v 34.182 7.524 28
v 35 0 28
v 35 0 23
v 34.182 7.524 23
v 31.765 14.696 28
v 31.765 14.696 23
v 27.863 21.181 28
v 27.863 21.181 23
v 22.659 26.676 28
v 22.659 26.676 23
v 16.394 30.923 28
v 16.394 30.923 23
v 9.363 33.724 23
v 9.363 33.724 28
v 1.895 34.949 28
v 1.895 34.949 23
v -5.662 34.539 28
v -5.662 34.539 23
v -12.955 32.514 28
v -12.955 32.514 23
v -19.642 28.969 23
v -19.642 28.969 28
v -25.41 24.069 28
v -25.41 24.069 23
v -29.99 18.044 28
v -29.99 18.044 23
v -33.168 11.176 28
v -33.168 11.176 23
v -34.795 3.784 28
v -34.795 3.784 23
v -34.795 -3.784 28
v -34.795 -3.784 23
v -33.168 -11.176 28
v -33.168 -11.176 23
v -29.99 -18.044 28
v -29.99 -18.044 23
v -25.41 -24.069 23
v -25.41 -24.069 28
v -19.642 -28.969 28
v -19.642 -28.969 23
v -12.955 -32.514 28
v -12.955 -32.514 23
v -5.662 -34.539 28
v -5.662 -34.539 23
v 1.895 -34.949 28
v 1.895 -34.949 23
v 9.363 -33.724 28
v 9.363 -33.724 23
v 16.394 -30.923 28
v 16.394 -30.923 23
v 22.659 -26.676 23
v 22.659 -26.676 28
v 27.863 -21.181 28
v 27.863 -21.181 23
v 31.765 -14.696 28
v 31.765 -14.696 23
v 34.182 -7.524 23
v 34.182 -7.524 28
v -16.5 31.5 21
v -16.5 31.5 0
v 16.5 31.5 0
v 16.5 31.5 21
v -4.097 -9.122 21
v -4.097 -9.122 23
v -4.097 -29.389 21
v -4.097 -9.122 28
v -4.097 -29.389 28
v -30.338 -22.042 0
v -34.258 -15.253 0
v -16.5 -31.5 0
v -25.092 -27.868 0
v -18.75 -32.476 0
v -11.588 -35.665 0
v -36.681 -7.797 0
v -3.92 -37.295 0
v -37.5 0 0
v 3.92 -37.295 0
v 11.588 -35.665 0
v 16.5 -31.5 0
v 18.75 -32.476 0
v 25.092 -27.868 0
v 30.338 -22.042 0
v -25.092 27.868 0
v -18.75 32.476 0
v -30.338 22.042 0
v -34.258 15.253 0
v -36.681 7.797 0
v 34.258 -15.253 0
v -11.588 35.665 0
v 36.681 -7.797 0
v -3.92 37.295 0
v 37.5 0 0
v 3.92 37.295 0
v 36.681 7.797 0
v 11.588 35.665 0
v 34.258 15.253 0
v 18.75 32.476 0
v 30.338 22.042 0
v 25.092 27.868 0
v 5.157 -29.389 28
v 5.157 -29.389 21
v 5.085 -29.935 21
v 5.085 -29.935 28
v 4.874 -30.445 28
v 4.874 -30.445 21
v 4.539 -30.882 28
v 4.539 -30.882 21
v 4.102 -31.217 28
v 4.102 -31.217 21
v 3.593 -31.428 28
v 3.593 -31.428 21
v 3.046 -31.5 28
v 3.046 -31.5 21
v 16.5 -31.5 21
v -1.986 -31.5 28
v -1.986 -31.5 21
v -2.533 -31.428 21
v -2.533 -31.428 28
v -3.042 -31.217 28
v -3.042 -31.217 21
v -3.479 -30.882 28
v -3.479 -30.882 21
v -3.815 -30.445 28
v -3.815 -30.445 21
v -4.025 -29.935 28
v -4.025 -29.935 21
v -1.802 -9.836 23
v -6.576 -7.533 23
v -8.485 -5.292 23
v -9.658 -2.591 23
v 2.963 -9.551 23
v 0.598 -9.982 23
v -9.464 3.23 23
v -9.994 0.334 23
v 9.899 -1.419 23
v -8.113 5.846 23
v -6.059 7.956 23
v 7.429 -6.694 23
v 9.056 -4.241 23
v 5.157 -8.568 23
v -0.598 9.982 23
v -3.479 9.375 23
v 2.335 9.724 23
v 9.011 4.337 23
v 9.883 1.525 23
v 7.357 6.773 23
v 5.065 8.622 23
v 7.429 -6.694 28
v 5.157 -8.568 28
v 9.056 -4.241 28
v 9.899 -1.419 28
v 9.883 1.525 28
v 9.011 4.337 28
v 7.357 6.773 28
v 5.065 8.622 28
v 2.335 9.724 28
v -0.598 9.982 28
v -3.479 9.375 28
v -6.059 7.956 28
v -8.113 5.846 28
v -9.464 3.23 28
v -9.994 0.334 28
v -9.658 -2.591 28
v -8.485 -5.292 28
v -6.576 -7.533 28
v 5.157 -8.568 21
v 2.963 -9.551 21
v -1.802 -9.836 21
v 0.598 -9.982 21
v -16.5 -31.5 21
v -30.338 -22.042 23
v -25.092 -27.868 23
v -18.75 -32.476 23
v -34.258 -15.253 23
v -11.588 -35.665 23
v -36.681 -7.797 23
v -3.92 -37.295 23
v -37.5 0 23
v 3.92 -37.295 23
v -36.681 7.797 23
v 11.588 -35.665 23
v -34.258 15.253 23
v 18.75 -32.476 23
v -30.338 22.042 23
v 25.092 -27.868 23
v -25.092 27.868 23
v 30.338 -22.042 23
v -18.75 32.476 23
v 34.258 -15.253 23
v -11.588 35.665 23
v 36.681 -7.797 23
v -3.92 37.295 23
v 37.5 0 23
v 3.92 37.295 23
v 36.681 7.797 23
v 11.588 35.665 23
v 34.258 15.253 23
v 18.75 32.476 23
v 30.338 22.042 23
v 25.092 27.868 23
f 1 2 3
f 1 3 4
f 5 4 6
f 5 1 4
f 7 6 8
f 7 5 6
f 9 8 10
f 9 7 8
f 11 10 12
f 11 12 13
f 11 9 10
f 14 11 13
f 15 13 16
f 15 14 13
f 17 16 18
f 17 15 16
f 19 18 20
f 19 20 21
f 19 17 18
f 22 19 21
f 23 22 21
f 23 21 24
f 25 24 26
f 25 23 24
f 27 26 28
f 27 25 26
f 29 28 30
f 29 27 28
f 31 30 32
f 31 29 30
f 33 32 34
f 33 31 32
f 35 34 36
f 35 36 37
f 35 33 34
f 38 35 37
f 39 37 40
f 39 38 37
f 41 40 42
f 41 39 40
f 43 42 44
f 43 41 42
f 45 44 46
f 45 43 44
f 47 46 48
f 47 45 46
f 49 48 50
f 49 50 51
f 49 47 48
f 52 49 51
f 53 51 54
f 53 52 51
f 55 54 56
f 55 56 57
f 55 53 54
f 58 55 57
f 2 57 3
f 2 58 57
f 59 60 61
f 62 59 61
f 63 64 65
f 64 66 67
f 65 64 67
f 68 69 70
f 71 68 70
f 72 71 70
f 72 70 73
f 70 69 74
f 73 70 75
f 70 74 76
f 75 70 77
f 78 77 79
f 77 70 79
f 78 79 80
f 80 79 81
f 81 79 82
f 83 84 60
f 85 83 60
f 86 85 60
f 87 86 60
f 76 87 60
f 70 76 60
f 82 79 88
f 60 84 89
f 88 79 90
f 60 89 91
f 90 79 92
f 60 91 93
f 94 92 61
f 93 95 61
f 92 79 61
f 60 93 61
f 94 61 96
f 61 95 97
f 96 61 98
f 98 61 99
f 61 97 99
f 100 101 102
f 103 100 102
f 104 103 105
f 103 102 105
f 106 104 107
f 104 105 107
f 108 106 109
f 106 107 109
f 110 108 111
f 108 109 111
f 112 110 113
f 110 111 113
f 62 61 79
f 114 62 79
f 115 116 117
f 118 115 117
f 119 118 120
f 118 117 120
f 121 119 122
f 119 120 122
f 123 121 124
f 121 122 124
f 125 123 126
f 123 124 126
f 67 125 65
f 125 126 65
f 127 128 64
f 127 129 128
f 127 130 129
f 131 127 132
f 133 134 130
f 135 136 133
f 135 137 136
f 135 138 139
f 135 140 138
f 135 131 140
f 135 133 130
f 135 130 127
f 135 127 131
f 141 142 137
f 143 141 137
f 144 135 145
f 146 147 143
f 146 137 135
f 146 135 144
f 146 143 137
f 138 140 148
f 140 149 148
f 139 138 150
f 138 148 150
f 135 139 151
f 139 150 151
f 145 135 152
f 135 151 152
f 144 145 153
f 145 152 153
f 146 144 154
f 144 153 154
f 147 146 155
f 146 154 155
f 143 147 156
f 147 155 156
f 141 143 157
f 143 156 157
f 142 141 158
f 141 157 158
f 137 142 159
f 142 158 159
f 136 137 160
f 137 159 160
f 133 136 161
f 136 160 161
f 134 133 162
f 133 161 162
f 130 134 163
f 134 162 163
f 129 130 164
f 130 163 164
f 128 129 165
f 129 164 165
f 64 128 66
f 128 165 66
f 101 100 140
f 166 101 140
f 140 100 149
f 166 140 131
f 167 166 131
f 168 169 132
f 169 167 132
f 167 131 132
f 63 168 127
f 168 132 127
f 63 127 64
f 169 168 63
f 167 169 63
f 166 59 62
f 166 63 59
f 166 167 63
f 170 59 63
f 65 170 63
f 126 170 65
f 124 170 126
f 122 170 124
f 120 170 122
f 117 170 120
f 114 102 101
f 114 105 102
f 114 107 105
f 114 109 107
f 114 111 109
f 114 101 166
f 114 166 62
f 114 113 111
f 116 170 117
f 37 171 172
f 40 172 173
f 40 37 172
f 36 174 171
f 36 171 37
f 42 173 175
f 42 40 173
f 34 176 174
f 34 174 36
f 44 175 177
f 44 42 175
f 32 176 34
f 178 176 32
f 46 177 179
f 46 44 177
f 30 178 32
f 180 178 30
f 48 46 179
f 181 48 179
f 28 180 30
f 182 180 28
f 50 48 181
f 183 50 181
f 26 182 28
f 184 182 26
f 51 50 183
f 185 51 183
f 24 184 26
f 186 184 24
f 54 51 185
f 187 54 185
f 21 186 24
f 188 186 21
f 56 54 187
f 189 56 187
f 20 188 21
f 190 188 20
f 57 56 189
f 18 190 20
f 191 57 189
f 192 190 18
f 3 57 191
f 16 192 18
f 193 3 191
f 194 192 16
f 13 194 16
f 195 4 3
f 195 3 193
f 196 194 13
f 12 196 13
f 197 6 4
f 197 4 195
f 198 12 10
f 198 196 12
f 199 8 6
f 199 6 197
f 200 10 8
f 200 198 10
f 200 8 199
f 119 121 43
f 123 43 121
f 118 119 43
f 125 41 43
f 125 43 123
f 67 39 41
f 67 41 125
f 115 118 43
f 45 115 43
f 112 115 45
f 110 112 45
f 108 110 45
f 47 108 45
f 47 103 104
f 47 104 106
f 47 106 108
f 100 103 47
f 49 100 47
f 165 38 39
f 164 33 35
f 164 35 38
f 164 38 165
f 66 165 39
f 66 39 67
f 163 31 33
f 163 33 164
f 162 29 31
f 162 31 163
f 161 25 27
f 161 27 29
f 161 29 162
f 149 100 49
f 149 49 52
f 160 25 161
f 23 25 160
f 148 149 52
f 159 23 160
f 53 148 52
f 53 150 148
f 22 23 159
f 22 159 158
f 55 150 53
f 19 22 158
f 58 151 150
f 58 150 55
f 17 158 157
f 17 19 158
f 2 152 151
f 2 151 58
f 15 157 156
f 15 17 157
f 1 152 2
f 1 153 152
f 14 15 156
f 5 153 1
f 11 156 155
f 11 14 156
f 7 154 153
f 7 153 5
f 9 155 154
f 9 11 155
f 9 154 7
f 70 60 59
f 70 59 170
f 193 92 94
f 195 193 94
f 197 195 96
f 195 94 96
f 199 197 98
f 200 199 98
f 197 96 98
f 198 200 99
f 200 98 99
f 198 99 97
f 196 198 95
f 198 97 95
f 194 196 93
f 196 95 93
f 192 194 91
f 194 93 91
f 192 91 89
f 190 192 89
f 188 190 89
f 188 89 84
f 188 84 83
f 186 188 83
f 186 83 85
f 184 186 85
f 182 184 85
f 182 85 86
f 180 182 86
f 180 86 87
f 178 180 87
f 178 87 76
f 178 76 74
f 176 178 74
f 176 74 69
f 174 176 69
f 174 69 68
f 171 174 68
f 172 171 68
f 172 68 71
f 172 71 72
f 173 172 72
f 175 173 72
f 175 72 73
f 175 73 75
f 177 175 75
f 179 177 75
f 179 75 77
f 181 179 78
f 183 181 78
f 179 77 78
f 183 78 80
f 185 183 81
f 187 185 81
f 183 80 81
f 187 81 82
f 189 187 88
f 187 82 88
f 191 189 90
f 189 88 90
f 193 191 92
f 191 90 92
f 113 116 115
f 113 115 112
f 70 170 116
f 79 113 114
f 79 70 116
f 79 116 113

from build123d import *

# Parameters (mm, degrees)
F0_R      = 37.5
F1_DEPTH  = 28
F2_W      = 33
F2_H      = 63
F3_DEPTH  = 21
F4_R      = 10
F5_DEPTH  = 5
F7_DEPTH  = 25
F9_DEPTH  = 15
F10_R     = 37.5
F10_R_2   = 35
F11_DEPTH = 5


with BuildPart() as f1:
    # F0 (on Top) → F1 (new body)
    with BuildSketch(Plane.XY):
        Circle(F0_R)
    extrude(amount=F1_DEPTH)

    # F2 (on face) → F3 (cut)
    with BuildSketch(Plane(origin=(0, 0, 0), x_dir=(1, 0, 0), z_dir=(0, 0, -1))):
        Rectangle(F2_W, F2_H)
    extrude(amount=-F3_DEPTH, mode=Mode.SUBTRACT)

    # F4 (on face) → F5 (cut)
    with BuildSketch(Plane.XY.offset(28)):
        Circle(F4_R)
    extrude(amount=-F5_DEPTH, mode=Mode.SUBTRACT)

    # F6 (on face) → F7 (cut)
    with BuildSketch(Plane(origin=(0, 0, 21), x_dir=(1, 0, 0), z_dir=(0, 0, -1))):
        with BuildLine():
            Line((3.0463133007, 31.5), (-1.9864209462, 31.5))
            ThreePointArc((-1.9864209462, 31.5), (-4.0973785389, 29.3890424073), (-1.9864209462, 27.2780848145))
            Line((-1.9864209462, 27.2780848145), (3.0463133007, 27.2780848145))
            ThreePointArc((3.0463133007, 27.2780848145), (5.1572708935, 29.3890424073), (3.0463133007, 31.5))
        make_face()
    extrude(amount=-F7_DEPTH, mode=Mode.SUBTRACT)

    # F8 (on face) → F9 (cut)
    with BuildSketch(Plane.XY.offset(28)):
        with BuildLine():
            Line((-4.0973785389, -9.1220331675), (-4.0973785389, -29.3890424073))
            ThreePointArc((-4.0973785389, -29.3890424073), (-3.4790933748, -27.8963699787), (-1.9864209462, -27.2780848145))
            Line((-1.9864209462, -27.2780848145), (3.0463133007, -27.2780848145))
            ThreePointArc((3.0463133007, -27.2780848145), (4.5389857293, -27.8963699787), (5.1572708935, -29.3890424073))
            Line((5.1572708935, -29.3890424073), (5.1572708935, -8.5675292198))
            ThreePointArc((5.1572708935, -8.5675292198), (0.5980899663, -9.9820983962), (-4.0973785389, -9.1220331675))
        make_face()
    extrude(amount=-F9_DEPTH, mode=Mode.SUBTRACT)

    # F10 (on face) → F11 (cut)
    with BuildSketch(Plane.XY.offset(28)):
        Circle(F10_R)
        Circle(F10_R_2, mode=Mode.SUBTRACT)
    extrude(amount=-F11_DEPTH, mode=Mode.SUBTRACT)


solid = f1.part
